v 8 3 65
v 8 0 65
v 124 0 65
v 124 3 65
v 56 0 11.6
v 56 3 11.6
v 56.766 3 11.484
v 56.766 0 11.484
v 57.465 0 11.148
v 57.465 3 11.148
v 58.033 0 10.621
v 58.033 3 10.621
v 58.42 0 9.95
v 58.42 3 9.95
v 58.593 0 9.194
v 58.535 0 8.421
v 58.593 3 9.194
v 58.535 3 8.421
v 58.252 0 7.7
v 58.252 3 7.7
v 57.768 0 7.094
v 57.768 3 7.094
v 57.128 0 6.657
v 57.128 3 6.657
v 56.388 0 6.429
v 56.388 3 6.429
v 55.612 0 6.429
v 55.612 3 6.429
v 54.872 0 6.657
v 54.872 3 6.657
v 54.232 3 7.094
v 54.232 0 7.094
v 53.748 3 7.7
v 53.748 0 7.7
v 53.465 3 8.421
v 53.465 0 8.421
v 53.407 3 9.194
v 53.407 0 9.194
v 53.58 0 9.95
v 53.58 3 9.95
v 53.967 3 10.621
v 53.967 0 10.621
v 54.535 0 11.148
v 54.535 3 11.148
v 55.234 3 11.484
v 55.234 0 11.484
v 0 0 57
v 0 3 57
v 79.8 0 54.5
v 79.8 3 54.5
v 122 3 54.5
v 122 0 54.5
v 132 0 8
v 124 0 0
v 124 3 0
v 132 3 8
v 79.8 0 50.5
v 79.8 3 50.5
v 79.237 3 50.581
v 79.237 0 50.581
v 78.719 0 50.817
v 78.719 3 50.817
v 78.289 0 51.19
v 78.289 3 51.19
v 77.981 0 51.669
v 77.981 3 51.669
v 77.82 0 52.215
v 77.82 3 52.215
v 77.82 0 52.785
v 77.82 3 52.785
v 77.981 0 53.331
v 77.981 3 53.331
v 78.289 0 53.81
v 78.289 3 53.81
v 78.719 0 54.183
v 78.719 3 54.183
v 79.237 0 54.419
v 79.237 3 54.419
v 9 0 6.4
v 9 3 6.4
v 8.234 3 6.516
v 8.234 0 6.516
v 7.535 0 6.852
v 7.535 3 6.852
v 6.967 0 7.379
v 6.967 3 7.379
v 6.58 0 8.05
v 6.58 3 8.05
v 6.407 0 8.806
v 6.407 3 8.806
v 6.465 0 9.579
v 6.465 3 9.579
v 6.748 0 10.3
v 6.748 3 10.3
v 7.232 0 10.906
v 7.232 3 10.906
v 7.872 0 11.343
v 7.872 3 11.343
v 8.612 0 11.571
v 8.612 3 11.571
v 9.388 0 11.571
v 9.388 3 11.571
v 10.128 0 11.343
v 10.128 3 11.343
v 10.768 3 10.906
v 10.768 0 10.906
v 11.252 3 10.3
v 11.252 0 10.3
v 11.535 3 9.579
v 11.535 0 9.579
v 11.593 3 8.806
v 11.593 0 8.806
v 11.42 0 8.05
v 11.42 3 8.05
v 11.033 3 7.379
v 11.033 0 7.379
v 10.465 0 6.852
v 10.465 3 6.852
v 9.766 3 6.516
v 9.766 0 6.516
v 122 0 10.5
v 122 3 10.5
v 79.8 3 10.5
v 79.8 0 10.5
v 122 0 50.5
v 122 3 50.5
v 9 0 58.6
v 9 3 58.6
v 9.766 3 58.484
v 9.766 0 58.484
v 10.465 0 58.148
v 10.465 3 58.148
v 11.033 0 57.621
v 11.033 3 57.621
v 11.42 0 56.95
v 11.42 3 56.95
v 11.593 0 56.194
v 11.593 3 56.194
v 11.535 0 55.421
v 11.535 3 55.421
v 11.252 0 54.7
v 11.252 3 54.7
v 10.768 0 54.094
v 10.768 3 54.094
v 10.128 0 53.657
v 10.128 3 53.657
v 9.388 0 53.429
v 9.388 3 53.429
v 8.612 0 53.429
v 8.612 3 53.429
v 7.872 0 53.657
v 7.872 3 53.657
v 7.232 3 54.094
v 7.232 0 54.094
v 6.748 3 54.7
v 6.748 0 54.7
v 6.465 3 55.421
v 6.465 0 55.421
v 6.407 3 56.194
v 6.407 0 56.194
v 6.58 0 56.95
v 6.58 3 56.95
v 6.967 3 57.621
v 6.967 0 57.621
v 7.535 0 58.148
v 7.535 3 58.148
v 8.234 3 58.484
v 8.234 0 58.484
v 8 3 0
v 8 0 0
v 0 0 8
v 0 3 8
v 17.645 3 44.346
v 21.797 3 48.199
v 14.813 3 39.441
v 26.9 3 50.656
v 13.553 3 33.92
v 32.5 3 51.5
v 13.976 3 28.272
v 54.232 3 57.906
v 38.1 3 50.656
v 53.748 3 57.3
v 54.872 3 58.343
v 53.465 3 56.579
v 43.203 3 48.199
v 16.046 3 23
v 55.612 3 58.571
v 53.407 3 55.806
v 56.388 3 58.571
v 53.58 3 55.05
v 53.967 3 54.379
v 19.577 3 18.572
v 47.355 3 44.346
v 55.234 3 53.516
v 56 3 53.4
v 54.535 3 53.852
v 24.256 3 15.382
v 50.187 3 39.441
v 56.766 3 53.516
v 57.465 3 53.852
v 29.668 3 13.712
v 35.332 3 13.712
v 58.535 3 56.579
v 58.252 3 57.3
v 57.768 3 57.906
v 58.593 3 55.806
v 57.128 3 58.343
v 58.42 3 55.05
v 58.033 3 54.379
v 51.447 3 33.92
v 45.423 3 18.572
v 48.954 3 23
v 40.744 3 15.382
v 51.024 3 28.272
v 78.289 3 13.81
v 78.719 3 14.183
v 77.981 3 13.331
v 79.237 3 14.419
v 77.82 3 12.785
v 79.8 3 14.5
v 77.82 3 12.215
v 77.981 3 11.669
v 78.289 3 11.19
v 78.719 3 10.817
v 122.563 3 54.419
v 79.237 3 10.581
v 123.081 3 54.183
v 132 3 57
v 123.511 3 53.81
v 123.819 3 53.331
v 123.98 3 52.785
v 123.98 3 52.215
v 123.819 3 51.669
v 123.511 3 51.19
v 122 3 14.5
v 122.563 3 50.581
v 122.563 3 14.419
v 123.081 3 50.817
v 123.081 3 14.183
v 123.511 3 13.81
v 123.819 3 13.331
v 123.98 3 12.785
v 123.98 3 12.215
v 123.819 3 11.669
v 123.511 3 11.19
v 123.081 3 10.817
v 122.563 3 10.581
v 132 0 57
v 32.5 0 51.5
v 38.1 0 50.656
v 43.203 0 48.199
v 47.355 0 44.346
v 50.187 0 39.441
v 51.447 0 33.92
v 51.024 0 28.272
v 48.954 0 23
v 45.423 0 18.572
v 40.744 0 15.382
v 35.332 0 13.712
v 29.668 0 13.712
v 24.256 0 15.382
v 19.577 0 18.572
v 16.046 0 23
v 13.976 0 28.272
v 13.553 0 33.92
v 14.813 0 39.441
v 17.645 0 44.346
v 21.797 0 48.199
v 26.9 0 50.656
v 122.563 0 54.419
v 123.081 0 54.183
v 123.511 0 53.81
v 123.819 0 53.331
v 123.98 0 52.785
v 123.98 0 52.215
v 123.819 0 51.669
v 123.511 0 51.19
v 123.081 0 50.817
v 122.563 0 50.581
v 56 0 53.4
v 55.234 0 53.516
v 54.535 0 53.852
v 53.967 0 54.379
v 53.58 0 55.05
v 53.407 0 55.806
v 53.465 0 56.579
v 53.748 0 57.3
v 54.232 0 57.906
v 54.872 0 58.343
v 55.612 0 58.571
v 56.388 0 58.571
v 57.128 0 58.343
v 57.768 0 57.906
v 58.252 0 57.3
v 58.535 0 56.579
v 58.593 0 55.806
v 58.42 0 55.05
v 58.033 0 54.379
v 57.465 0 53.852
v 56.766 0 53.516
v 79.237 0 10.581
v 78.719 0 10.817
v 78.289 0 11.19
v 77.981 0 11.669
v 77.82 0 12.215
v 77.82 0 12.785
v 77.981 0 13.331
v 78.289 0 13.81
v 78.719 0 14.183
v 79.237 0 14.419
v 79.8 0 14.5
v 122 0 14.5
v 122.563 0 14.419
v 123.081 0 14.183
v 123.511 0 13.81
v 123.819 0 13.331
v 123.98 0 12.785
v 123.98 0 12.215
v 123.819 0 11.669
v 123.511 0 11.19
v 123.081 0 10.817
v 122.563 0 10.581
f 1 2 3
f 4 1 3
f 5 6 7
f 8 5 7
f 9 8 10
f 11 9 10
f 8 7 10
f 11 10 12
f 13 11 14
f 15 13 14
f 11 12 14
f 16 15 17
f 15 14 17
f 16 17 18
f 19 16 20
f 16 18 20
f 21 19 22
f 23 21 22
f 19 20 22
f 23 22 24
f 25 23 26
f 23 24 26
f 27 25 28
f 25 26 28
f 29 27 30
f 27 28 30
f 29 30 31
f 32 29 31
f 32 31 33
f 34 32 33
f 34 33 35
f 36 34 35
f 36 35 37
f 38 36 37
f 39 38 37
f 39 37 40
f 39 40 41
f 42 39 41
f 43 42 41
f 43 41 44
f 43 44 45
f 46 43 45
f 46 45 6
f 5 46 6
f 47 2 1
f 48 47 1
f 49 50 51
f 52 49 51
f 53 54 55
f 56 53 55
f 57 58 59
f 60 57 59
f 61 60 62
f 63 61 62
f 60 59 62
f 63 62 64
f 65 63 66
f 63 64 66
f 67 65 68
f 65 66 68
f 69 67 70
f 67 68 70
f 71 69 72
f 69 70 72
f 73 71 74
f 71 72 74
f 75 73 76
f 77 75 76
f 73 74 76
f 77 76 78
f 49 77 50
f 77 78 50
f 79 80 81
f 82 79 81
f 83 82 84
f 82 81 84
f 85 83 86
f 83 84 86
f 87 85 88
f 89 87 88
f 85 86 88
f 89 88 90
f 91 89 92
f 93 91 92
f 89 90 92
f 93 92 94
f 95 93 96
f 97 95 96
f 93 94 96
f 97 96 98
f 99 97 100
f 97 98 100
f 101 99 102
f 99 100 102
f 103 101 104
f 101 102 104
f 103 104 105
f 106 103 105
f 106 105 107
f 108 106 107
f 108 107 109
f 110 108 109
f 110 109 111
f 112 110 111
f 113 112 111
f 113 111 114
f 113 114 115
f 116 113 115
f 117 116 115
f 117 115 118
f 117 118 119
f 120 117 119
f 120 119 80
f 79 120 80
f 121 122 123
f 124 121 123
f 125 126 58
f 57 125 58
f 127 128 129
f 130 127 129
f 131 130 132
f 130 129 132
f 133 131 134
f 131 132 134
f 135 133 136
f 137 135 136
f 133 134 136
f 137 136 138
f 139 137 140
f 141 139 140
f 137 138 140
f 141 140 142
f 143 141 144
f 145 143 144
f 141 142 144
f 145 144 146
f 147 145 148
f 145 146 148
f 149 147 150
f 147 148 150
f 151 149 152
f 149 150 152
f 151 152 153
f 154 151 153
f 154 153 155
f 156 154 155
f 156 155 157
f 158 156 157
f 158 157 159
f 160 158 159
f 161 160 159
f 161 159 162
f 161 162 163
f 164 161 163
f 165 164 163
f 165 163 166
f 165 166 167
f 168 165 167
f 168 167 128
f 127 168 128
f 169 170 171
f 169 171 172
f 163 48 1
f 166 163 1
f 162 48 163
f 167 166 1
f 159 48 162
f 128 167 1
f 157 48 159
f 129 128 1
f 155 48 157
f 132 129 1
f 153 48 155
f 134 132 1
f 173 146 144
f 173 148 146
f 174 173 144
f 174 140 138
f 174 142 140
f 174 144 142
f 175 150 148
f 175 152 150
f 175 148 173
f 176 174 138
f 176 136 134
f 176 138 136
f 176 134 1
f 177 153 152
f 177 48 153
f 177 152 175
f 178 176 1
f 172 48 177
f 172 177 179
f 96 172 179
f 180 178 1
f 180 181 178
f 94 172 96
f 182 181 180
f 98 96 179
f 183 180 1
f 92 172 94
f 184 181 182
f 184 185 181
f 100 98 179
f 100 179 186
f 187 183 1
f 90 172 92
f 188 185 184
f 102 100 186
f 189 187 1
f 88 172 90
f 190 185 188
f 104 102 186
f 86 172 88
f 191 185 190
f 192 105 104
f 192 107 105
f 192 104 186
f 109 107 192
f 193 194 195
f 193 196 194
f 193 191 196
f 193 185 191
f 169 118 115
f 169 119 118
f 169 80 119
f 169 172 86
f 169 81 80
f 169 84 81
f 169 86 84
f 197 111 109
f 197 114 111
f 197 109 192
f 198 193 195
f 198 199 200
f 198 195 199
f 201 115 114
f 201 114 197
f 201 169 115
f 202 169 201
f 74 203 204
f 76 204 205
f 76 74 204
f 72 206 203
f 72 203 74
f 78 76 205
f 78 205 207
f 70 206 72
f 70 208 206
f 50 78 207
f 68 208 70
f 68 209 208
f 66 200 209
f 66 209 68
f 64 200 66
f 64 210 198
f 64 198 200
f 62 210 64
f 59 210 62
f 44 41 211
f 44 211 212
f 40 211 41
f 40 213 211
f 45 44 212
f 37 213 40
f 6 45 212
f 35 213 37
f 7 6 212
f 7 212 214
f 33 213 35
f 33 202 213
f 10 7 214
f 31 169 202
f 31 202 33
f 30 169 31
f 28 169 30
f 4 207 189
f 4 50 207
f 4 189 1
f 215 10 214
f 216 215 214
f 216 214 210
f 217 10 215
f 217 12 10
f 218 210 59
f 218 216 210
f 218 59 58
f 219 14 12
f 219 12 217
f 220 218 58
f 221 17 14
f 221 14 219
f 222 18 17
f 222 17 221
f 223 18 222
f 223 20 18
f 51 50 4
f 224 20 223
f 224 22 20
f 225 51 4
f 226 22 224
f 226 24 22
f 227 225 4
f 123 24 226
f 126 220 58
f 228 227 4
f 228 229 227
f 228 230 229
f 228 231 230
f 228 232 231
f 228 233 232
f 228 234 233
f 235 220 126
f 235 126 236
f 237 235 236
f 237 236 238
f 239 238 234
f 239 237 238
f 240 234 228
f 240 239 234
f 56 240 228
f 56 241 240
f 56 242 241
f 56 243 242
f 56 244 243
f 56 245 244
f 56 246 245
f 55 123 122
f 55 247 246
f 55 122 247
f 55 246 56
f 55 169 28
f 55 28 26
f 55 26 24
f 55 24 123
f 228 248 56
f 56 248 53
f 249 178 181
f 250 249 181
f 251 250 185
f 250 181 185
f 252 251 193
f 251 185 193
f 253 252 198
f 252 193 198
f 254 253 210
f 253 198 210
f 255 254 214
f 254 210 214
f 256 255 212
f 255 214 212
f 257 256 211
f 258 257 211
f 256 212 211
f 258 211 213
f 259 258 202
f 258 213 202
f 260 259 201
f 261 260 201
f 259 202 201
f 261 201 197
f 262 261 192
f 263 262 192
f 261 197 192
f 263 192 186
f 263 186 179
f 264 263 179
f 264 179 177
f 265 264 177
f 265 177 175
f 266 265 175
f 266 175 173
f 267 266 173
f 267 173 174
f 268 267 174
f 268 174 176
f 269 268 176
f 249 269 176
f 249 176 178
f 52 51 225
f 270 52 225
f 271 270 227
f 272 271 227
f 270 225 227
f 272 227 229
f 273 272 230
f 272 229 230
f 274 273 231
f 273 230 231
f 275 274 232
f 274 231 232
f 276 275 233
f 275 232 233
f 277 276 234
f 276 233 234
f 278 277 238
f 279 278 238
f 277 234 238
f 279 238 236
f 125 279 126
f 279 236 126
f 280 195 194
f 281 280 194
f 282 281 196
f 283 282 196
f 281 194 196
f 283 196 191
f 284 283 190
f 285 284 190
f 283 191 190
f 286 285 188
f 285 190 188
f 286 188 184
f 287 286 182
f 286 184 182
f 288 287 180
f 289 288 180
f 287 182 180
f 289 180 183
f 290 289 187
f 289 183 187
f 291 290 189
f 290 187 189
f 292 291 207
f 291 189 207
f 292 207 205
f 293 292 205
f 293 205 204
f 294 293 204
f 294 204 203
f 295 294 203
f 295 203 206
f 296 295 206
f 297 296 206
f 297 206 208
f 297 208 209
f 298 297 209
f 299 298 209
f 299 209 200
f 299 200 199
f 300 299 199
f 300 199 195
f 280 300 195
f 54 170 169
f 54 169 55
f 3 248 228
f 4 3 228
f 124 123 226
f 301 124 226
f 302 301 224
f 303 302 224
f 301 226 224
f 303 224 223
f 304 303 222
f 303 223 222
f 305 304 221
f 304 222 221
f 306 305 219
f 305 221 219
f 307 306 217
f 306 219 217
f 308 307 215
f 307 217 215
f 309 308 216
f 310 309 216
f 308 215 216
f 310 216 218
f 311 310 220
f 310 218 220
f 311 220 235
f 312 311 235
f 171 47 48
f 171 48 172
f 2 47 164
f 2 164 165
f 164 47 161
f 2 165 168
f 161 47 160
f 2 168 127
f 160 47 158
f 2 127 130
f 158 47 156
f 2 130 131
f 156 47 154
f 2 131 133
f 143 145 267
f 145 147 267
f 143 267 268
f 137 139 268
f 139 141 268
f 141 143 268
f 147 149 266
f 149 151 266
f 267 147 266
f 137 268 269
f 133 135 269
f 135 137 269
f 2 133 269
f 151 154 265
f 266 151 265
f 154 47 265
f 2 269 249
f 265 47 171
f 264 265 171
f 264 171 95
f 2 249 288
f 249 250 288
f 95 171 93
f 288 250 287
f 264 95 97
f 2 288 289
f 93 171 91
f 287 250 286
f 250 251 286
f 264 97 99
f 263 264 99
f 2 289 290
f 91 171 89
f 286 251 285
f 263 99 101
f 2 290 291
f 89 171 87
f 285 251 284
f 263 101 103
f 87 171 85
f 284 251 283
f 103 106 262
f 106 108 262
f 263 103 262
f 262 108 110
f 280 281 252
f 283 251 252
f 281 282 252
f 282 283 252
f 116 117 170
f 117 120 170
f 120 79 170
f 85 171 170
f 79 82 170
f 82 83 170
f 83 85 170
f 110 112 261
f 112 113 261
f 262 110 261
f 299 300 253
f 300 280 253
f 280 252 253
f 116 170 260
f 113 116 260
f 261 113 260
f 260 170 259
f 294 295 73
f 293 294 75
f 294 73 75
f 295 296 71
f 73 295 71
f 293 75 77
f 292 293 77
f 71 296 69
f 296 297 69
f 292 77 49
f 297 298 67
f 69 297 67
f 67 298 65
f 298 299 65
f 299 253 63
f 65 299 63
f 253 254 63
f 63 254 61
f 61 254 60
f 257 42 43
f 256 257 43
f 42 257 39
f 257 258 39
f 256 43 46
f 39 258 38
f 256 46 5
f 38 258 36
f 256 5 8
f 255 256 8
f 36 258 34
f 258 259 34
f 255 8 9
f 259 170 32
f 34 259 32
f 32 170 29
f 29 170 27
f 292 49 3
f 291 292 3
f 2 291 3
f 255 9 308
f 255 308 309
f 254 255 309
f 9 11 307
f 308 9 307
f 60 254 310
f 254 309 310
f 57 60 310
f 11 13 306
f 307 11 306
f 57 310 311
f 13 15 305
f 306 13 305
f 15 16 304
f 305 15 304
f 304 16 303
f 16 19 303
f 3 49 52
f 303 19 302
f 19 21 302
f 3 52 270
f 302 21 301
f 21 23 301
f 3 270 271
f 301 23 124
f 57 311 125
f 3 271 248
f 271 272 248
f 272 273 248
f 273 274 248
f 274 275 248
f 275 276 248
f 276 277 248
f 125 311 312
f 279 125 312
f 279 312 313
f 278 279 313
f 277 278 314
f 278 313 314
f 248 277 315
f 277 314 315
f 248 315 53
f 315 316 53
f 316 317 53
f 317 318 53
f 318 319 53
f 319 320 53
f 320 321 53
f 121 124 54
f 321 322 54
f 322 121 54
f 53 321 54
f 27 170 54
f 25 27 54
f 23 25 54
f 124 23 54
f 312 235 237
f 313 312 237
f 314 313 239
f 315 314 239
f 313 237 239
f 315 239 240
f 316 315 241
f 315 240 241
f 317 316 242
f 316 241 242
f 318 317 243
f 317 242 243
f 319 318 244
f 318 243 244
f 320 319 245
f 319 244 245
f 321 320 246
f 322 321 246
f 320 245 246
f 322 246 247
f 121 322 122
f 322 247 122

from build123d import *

# Parameters (mm, degrees)
SKETCH1_W             = 132
SKETCH1_H             = 65
MAIN_PLATE_BODY_DEPTH = 3
CHAMFER1_SIZE         = 8
MAIN_MOTOR_HOLE_R     = 19
MAIN_MOTOR_HOLE_R_2   = 2.6
MOTOR_HOLES_DEPTH     = 148.166572291
MOUNTING_SLOTS_DEPTH  = 148.166572291


with BuildPart() as part:
    # Sketch1 → Main Plate Body (new body)
    with BuildSketch(Plane(origin=(0, 0, 0), x_dir=(1, 0, 0), z_dir=(0, 1, 0))):
        with Locations((66, -32.5)):
            Rectangle(SKETCH1_W, SKETCH1_H)
    extrude(amount=MAIN_PLATE_BODY_DEPTH)

    # Chamfer1
    chamfer1_edges = [part.edges().sort_by_distance(p)[0] for p in [
        (0, 1.5, 0),
        (132, 1.5, 0),
        (132, 1.5, 65),
        (0, 1.5, 65),
    ]]
    chamfer(chamfer1_edges, length=CHAMFER1_SIZE)

    # Main Motor Hole → Motor Holes (cut, through all)
    with BuildSketch(Plane(origin=(0, 3, 0), x_dir=(1, 0, 0), z_dir=(0, 1, 0))):
        with Locations(Location((32.5, -32.5, 0), (0, 0, 270))):
            Circle(MAIN_MOTOR_HOLE_R)
        with Locations(Location((9, -56, 0), (0, 0, 270))):
            Circle(MAIN_MOTOR_HOLE_R_2)
        with Locations(Location((56, -56, 0), (0, 0, 90))):
            Circle(MAIN_MOTOR_HOLE_R_2)
        with Locations(Location((56, -9, 0), (0, 0, 270))):
            Circle(MAIN_MOTOR_HOLE_R_2)
        with Locations(Location((9, -9, 0), (0, 0, 90))):
            Circle(MAIN_MOTOR_HOLE_R_2)
    extrude(amount=-MOTOR_HOLES_DEPTH, mode=Mode.SUBTRACT)

    # T-Slot Mounting Slots → Mounting Slots (cut, through all)
    with BuildSketch(Plane(origin=(0, 3, 0), x_dir=(1, 0, 0), z_dir=(0, 1, 0))):
        with BuildLine():
            Line((122, -50.5), (79.8, -50.5))
            ThreePointArc((79.8, -50.5), (77.8, -52.5), (79.8, -54.5))
            Line((79.8, -54.5), (122, -54.5))
            ThreePointArc((122, -54.5), (124, -52.5), (122, -50.5))
        make_face()
        with BuildLine():
            Line((122, -10.5), (79.8, -10.5))
            ThreePointArc((79.8, -10.5), (77.8, -12.5), (79.8, -14.5))
            Line((79.8, -14.5), (122, -14.5))
            ThreePointArc((122, -14.5), (124, -12.5), (122, -10.5))
        make_face()
    extrude(amount=-MOUNTING_SLOTS_DEPTH, mode=Mode.SUBTRACT)


solid = part.part
